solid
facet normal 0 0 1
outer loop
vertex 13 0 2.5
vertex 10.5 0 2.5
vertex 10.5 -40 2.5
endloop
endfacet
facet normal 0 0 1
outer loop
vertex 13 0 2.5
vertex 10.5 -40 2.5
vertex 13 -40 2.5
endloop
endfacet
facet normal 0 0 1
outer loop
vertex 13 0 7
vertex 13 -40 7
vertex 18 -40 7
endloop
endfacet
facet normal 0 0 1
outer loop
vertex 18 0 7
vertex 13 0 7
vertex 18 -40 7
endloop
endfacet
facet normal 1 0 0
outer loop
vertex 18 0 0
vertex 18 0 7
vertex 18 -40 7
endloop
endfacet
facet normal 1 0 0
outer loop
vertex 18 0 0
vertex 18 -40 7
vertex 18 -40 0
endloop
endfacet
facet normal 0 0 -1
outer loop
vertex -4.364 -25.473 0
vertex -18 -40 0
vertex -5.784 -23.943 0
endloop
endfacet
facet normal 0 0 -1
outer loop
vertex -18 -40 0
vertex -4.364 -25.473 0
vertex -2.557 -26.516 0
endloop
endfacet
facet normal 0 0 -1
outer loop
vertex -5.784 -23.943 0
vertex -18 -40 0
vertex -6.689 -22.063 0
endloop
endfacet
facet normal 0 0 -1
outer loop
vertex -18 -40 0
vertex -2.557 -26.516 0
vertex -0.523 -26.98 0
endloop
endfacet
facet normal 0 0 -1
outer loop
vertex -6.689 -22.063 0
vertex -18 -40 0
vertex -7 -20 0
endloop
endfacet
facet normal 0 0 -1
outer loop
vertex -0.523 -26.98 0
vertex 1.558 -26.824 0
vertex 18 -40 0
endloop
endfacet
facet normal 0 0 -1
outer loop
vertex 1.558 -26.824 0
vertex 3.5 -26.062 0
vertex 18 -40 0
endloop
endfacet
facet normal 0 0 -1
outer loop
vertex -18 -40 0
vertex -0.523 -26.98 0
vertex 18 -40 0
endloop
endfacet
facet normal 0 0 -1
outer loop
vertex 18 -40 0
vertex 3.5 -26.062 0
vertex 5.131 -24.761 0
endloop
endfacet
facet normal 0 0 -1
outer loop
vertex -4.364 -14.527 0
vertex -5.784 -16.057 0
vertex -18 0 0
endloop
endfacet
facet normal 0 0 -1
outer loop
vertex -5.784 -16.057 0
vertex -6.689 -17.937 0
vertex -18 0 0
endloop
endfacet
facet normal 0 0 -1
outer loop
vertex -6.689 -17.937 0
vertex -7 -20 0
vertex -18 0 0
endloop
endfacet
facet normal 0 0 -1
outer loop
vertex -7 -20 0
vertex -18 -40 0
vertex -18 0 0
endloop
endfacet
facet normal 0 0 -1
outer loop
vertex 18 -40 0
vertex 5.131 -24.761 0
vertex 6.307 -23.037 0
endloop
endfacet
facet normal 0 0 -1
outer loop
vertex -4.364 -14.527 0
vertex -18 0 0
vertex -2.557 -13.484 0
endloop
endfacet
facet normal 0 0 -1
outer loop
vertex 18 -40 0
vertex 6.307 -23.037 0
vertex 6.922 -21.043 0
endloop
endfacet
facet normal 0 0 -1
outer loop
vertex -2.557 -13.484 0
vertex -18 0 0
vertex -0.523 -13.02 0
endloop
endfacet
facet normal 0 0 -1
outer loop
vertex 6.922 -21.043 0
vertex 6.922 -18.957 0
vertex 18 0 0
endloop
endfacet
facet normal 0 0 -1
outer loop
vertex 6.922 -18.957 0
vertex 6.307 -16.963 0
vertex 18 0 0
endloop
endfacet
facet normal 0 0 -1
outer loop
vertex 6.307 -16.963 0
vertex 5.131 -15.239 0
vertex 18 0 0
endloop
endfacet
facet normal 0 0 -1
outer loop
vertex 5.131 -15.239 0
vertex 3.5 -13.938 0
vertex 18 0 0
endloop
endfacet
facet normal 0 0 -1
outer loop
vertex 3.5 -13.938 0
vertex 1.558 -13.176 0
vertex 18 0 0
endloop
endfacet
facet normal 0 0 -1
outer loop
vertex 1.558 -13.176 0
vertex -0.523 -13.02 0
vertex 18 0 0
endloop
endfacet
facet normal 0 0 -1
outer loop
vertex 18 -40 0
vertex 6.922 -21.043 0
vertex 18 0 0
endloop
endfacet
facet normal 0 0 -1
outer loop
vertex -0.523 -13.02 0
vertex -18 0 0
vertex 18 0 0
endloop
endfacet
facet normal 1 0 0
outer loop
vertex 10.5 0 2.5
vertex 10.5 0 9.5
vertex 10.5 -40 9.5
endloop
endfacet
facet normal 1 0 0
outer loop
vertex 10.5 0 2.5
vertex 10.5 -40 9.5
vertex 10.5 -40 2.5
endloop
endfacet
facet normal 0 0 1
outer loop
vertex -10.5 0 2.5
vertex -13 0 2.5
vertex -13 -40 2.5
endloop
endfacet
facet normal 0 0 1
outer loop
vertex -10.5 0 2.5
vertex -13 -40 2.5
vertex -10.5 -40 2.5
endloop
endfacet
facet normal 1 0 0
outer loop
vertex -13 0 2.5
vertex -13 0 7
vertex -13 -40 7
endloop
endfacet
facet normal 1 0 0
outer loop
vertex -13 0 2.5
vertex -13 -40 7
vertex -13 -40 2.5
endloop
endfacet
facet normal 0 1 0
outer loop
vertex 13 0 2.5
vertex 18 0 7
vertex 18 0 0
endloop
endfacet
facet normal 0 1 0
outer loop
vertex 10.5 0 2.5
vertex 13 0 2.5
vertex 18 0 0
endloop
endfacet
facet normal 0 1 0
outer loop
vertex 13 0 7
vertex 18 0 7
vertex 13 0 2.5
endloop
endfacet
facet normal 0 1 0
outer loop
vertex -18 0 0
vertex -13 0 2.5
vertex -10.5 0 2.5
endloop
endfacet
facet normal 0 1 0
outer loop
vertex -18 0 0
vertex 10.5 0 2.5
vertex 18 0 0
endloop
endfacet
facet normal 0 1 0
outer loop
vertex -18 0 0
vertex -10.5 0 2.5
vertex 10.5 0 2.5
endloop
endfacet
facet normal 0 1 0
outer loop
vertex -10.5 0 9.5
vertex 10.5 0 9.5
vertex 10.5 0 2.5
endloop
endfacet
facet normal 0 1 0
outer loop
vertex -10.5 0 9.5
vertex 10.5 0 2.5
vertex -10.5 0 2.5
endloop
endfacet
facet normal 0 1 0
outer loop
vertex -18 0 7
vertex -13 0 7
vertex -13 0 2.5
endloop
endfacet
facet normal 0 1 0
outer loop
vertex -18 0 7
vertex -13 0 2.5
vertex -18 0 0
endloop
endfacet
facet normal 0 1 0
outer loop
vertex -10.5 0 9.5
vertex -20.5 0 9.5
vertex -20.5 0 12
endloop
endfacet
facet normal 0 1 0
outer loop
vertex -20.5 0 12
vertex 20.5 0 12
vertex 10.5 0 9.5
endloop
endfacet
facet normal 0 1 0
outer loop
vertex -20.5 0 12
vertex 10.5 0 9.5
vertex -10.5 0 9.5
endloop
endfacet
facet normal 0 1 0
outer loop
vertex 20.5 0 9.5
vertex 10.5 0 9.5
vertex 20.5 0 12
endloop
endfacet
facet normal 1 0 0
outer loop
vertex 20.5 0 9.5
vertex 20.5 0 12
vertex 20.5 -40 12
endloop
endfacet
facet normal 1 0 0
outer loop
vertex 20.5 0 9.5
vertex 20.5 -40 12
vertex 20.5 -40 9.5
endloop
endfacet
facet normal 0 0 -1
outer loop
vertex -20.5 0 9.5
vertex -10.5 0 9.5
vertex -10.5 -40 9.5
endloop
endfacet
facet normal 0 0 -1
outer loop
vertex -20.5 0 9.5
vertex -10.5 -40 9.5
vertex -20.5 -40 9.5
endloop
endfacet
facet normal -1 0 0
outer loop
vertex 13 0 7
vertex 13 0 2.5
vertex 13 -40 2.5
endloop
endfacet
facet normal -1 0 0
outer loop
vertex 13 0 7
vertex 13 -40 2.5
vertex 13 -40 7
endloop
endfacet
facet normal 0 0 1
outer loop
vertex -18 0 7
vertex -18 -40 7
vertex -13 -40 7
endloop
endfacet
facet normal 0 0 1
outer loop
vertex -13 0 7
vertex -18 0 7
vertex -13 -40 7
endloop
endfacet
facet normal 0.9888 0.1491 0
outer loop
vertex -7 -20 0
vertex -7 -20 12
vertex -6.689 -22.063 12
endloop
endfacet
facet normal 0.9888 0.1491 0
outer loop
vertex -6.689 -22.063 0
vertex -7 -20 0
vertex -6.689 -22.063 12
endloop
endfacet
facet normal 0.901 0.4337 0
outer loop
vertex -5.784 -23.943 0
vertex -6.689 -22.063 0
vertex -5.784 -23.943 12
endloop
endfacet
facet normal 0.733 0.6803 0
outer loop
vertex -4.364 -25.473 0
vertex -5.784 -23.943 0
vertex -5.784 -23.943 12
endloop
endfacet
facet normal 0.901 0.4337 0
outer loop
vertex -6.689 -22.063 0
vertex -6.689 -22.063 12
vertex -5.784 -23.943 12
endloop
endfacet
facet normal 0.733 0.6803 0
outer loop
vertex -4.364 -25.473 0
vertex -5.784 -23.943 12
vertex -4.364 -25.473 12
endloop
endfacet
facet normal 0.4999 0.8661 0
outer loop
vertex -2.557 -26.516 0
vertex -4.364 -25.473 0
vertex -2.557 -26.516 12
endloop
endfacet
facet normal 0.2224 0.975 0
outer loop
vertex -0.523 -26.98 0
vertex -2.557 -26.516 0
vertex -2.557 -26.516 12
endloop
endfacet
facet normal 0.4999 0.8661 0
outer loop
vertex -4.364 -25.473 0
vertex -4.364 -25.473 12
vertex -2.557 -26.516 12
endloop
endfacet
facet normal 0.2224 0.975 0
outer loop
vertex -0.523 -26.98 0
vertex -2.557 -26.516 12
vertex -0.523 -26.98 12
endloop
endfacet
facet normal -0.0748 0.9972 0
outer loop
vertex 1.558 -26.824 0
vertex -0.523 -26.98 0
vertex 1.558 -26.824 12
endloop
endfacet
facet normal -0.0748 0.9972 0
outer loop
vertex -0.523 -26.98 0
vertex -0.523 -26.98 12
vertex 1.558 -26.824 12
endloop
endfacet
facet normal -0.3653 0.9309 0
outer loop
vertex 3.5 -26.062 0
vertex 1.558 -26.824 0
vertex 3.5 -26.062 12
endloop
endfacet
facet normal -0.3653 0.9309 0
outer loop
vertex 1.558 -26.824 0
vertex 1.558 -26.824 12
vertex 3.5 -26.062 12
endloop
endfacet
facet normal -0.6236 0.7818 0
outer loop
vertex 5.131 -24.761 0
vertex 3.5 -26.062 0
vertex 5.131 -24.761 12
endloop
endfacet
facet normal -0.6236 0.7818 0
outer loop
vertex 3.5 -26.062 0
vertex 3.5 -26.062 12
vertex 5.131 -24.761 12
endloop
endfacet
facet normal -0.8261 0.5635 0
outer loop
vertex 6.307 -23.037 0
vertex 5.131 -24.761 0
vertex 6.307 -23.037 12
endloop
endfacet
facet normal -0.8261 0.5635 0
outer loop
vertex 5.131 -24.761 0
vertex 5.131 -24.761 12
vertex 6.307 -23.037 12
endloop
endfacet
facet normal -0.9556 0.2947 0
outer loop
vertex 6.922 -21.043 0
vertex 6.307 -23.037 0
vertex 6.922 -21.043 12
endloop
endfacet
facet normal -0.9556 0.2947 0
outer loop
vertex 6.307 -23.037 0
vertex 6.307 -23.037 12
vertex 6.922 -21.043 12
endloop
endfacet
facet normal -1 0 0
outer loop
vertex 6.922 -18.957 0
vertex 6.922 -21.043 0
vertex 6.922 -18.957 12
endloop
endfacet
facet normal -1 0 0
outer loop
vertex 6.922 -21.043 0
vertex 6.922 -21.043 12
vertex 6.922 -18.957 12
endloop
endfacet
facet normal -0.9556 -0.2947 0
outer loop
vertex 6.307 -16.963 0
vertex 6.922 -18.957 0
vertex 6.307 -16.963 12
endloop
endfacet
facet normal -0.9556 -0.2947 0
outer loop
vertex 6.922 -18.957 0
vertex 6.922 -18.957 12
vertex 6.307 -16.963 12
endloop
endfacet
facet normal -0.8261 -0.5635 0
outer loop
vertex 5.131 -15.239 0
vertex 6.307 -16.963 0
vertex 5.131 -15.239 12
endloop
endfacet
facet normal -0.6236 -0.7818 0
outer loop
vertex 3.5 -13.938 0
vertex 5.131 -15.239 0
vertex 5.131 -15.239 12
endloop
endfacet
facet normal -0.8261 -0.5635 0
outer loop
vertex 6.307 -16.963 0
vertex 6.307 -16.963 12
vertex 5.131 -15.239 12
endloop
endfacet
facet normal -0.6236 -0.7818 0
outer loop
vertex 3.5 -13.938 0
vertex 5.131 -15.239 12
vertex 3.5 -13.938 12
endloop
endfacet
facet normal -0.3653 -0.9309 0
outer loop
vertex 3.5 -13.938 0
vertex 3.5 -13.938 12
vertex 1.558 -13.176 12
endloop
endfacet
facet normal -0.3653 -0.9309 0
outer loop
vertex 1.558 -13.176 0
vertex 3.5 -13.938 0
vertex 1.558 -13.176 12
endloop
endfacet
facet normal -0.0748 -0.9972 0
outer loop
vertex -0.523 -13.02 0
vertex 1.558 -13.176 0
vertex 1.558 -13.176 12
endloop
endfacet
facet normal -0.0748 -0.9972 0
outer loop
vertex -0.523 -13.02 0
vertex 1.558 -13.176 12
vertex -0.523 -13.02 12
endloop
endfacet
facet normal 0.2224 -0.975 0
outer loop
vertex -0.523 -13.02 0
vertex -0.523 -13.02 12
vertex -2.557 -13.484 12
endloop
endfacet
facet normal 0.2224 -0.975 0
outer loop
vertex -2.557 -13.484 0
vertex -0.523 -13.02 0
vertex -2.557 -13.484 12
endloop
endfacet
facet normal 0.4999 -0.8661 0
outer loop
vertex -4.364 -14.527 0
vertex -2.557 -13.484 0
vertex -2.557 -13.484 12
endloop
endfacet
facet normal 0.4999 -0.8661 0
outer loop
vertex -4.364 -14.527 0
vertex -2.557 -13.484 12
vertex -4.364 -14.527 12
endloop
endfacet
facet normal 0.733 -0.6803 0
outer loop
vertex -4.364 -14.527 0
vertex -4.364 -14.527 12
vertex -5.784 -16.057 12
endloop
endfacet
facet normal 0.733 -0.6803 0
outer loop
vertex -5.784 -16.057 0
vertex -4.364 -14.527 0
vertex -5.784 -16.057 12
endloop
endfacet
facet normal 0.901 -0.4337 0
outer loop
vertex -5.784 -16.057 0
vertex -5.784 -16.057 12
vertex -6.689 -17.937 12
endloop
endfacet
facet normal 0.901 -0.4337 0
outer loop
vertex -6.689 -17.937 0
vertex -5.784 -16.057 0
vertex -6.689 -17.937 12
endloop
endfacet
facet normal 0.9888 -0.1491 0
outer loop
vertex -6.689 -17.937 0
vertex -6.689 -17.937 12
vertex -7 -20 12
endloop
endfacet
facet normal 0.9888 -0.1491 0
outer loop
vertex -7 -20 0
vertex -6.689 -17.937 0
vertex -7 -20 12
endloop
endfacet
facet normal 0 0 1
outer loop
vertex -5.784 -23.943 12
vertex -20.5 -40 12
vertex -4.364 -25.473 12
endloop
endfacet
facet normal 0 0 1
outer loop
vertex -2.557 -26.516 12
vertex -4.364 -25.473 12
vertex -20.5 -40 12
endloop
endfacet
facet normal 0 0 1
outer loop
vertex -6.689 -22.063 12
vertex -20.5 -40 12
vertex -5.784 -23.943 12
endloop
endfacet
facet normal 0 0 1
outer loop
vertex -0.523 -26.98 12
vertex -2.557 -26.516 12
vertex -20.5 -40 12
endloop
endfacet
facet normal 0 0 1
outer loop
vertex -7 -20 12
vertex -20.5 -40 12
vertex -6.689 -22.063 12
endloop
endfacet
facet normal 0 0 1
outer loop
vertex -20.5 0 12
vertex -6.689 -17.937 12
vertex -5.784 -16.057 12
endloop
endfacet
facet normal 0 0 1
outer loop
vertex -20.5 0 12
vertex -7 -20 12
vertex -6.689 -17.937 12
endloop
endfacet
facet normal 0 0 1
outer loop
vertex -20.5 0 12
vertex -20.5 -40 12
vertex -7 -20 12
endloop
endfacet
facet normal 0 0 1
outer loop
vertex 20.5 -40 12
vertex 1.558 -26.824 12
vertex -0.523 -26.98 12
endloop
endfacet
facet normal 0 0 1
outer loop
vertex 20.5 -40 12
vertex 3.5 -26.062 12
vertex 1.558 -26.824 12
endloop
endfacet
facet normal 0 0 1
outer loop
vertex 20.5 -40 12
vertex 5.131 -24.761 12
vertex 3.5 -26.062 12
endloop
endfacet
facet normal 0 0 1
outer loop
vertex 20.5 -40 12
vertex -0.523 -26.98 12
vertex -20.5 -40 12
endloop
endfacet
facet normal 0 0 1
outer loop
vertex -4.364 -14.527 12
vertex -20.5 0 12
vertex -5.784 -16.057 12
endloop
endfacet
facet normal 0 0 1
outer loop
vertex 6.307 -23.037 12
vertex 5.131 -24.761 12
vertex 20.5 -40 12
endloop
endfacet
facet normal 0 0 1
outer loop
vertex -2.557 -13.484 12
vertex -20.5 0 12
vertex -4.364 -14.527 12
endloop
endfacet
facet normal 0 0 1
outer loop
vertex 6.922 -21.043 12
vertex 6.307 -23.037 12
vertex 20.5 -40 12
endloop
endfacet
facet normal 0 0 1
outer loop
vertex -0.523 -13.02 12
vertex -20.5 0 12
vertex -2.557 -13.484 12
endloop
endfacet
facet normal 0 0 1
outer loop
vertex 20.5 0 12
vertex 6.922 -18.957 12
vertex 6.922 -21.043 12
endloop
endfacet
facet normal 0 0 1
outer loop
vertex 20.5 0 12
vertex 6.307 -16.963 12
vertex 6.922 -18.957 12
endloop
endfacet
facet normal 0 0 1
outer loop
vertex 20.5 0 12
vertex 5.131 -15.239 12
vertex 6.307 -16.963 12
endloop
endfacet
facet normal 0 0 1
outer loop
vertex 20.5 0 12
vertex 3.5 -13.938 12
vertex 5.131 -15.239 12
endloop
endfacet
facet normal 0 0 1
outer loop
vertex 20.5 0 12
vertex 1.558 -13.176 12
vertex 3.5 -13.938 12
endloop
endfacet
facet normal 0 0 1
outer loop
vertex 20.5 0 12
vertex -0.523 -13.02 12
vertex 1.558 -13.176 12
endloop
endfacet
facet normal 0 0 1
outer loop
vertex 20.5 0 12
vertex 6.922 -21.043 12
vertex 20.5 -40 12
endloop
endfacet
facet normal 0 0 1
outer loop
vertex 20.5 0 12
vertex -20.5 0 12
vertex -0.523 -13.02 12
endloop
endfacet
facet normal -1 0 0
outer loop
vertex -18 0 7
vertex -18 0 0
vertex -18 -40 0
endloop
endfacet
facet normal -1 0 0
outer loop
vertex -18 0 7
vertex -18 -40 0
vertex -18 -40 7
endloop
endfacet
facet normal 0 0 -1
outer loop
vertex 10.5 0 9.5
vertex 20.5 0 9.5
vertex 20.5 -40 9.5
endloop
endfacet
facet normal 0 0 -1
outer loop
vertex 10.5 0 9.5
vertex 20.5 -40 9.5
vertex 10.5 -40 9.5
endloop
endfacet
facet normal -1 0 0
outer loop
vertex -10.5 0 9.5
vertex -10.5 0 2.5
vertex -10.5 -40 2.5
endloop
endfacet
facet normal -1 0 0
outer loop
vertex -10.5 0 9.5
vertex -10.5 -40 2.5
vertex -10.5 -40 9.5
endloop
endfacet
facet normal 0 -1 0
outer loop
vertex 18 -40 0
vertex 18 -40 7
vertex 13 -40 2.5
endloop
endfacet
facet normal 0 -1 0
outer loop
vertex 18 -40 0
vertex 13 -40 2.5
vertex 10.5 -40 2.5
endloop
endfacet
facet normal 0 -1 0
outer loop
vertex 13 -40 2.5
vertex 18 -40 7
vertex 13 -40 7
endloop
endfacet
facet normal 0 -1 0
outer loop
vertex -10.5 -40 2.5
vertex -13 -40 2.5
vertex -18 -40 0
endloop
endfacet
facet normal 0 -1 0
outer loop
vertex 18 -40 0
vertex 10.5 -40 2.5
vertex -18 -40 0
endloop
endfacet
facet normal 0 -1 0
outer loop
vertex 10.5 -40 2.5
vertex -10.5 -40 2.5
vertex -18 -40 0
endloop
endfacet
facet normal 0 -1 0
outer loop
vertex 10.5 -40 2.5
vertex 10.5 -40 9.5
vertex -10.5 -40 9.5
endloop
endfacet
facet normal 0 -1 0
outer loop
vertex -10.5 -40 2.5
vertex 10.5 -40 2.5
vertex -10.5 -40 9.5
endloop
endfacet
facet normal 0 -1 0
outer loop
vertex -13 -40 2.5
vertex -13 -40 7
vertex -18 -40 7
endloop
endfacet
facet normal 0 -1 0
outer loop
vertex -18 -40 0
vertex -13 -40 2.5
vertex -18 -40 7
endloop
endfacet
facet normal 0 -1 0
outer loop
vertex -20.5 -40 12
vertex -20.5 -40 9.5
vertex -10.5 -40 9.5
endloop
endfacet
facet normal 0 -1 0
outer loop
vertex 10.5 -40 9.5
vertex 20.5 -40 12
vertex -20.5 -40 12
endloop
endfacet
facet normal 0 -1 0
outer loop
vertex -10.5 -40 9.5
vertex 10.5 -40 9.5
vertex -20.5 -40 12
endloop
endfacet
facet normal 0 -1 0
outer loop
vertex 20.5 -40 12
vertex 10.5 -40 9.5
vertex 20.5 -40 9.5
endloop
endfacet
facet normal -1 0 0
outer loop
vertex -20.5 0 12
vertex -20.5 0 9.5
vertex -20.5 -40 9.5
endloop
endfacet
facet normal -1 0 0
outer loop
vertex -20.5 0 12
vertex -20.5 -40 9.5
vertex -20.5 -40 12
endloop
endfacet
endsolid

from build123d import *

# Parameters (mm, degrees)
PAD_DEPTH   = 40
SKETCH001_R = 7
HOLE_DEPTH  = 12.001


with BuildPart() as part:
    # Sketch → Pad (new body)
    with BuildSketch(Plane.XZ):
        Polygon((0, 0), (-18, 0), (-18, 7), (-13, 7), (-13, 2.5), (-10.5, 2.5), (-10.5, 9.5), (-20.5, 9.5), (-20.5, 12), (20.5, 12), (20.5, 9.5), (10.5, 9.5), (10.5, 2.5), (13, 2.5), (13, 7), (18, 7), (18, 0), align=None)
    extrude(amount=PAD_DEPTH)

    # Sketch001 (on Face9 of Pad) → Hole (cut, through all)
    with BuildSketch(Plane(origin=(0, 0, 12), x_dir=(-1, 0, 0), z_dir=(0, 0, 1))):
        with Locations((0, 20)):
            Circle(SKETCH001_R)
    extrude(amount=-HOLE_DEPTH, mode=Mode.SUBTRACT)


solid = part.part
